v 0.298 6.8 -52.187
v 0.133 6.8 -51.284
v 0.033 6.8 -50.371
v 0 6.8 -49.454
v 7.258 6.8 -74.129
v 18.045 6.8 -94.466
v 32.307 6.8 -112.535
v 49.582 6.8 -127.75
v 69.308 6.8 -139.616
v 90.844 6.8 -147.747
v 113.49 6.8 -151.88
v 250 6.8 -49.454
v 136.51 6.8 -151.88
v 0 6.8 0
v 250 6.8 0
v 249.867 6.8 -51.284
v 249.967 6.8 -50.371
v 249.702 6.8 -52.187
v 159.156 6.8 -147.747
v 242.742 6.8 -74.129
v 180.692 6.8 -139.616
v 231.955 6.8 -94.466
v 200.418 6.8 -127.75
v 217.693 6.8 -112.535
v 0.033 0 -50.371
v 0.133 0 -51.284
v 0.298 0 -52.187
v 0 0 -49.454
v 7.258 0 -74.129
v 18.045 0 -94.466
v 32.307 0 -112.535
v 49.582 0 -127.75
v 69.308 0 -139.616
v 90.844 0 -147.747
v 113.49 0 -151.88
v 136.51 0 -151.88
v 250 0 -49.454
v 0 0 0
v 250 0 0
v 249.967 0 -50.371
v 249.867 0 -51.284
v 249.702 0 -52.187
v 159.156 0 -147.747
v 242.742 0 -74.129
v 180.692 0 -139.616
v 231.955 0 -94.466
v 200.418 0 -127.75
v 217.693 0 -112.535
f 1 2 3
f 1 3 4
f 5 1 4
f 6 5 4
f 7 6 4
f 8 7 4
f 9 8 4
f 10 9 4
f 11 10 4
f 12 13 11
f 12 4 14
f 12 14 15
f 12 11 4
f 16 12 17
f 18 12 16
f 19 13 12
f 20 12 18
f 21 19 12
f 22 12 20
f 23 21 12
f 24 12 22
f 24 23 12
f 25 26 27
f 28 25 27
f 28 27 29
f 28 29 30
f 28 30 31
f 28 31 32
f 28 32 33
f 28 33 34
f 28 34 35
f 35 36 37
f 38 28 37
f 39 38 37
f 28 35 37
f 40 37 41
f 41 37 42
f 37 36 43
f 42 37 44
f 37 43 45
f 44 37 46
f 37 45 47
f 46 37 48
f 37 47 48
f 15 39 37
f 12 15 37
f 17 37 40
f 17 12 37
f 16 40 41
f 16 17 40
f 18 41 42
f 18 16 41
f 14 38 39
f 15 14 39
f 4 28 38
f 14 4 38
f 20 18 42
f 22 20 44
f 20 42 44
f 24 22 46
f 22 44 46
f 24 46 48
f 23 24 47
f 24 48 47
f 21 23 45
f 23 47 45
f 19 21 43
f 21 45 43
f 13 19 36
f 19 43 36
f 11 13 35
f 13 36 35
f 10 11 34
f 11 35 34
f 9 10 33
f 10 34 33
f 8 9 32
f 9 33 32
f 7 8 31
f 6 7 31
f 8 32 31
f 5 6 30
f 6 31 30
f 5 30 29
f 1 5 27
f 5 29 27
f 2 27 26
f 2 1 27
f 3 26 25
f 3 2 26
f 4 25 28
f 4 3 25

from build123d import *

# Parameters (mm, degrees)
BOSS_EXTRUDE1_DEPTH = 6.8
FILLET1_R           = 12.7


with BuildPart() as part:
    # Sketch1 → Boss-Extrude1 (new body)
    with BuildSketch(Plane(origin=(0, 0, 0), x_dir=(1, 0, 0), z_dir=(0, 1, 0))):
        with BuildLine():
            Line((0, 0), (250, 0))
            Line((250, 0), (250, 50.8))
            ThreePointArc((250, 50.8), (125, 152.4), (0, 50.8))
            Line((0, 50.8), (0, 0))
        make_face()
    extrude(amount=BOSS_EXTRUDE1_DEPTH)

    # Fillet1
    fillet1_edges = [part.edges().sort_by_distance(p)[0] for p in [
        (0, 3.4, -50.8),
        (250, 3.4, -50.8),
    ]]
    fillet(fillet1_edges, radius=FILLET1_R)


solid = part.part
